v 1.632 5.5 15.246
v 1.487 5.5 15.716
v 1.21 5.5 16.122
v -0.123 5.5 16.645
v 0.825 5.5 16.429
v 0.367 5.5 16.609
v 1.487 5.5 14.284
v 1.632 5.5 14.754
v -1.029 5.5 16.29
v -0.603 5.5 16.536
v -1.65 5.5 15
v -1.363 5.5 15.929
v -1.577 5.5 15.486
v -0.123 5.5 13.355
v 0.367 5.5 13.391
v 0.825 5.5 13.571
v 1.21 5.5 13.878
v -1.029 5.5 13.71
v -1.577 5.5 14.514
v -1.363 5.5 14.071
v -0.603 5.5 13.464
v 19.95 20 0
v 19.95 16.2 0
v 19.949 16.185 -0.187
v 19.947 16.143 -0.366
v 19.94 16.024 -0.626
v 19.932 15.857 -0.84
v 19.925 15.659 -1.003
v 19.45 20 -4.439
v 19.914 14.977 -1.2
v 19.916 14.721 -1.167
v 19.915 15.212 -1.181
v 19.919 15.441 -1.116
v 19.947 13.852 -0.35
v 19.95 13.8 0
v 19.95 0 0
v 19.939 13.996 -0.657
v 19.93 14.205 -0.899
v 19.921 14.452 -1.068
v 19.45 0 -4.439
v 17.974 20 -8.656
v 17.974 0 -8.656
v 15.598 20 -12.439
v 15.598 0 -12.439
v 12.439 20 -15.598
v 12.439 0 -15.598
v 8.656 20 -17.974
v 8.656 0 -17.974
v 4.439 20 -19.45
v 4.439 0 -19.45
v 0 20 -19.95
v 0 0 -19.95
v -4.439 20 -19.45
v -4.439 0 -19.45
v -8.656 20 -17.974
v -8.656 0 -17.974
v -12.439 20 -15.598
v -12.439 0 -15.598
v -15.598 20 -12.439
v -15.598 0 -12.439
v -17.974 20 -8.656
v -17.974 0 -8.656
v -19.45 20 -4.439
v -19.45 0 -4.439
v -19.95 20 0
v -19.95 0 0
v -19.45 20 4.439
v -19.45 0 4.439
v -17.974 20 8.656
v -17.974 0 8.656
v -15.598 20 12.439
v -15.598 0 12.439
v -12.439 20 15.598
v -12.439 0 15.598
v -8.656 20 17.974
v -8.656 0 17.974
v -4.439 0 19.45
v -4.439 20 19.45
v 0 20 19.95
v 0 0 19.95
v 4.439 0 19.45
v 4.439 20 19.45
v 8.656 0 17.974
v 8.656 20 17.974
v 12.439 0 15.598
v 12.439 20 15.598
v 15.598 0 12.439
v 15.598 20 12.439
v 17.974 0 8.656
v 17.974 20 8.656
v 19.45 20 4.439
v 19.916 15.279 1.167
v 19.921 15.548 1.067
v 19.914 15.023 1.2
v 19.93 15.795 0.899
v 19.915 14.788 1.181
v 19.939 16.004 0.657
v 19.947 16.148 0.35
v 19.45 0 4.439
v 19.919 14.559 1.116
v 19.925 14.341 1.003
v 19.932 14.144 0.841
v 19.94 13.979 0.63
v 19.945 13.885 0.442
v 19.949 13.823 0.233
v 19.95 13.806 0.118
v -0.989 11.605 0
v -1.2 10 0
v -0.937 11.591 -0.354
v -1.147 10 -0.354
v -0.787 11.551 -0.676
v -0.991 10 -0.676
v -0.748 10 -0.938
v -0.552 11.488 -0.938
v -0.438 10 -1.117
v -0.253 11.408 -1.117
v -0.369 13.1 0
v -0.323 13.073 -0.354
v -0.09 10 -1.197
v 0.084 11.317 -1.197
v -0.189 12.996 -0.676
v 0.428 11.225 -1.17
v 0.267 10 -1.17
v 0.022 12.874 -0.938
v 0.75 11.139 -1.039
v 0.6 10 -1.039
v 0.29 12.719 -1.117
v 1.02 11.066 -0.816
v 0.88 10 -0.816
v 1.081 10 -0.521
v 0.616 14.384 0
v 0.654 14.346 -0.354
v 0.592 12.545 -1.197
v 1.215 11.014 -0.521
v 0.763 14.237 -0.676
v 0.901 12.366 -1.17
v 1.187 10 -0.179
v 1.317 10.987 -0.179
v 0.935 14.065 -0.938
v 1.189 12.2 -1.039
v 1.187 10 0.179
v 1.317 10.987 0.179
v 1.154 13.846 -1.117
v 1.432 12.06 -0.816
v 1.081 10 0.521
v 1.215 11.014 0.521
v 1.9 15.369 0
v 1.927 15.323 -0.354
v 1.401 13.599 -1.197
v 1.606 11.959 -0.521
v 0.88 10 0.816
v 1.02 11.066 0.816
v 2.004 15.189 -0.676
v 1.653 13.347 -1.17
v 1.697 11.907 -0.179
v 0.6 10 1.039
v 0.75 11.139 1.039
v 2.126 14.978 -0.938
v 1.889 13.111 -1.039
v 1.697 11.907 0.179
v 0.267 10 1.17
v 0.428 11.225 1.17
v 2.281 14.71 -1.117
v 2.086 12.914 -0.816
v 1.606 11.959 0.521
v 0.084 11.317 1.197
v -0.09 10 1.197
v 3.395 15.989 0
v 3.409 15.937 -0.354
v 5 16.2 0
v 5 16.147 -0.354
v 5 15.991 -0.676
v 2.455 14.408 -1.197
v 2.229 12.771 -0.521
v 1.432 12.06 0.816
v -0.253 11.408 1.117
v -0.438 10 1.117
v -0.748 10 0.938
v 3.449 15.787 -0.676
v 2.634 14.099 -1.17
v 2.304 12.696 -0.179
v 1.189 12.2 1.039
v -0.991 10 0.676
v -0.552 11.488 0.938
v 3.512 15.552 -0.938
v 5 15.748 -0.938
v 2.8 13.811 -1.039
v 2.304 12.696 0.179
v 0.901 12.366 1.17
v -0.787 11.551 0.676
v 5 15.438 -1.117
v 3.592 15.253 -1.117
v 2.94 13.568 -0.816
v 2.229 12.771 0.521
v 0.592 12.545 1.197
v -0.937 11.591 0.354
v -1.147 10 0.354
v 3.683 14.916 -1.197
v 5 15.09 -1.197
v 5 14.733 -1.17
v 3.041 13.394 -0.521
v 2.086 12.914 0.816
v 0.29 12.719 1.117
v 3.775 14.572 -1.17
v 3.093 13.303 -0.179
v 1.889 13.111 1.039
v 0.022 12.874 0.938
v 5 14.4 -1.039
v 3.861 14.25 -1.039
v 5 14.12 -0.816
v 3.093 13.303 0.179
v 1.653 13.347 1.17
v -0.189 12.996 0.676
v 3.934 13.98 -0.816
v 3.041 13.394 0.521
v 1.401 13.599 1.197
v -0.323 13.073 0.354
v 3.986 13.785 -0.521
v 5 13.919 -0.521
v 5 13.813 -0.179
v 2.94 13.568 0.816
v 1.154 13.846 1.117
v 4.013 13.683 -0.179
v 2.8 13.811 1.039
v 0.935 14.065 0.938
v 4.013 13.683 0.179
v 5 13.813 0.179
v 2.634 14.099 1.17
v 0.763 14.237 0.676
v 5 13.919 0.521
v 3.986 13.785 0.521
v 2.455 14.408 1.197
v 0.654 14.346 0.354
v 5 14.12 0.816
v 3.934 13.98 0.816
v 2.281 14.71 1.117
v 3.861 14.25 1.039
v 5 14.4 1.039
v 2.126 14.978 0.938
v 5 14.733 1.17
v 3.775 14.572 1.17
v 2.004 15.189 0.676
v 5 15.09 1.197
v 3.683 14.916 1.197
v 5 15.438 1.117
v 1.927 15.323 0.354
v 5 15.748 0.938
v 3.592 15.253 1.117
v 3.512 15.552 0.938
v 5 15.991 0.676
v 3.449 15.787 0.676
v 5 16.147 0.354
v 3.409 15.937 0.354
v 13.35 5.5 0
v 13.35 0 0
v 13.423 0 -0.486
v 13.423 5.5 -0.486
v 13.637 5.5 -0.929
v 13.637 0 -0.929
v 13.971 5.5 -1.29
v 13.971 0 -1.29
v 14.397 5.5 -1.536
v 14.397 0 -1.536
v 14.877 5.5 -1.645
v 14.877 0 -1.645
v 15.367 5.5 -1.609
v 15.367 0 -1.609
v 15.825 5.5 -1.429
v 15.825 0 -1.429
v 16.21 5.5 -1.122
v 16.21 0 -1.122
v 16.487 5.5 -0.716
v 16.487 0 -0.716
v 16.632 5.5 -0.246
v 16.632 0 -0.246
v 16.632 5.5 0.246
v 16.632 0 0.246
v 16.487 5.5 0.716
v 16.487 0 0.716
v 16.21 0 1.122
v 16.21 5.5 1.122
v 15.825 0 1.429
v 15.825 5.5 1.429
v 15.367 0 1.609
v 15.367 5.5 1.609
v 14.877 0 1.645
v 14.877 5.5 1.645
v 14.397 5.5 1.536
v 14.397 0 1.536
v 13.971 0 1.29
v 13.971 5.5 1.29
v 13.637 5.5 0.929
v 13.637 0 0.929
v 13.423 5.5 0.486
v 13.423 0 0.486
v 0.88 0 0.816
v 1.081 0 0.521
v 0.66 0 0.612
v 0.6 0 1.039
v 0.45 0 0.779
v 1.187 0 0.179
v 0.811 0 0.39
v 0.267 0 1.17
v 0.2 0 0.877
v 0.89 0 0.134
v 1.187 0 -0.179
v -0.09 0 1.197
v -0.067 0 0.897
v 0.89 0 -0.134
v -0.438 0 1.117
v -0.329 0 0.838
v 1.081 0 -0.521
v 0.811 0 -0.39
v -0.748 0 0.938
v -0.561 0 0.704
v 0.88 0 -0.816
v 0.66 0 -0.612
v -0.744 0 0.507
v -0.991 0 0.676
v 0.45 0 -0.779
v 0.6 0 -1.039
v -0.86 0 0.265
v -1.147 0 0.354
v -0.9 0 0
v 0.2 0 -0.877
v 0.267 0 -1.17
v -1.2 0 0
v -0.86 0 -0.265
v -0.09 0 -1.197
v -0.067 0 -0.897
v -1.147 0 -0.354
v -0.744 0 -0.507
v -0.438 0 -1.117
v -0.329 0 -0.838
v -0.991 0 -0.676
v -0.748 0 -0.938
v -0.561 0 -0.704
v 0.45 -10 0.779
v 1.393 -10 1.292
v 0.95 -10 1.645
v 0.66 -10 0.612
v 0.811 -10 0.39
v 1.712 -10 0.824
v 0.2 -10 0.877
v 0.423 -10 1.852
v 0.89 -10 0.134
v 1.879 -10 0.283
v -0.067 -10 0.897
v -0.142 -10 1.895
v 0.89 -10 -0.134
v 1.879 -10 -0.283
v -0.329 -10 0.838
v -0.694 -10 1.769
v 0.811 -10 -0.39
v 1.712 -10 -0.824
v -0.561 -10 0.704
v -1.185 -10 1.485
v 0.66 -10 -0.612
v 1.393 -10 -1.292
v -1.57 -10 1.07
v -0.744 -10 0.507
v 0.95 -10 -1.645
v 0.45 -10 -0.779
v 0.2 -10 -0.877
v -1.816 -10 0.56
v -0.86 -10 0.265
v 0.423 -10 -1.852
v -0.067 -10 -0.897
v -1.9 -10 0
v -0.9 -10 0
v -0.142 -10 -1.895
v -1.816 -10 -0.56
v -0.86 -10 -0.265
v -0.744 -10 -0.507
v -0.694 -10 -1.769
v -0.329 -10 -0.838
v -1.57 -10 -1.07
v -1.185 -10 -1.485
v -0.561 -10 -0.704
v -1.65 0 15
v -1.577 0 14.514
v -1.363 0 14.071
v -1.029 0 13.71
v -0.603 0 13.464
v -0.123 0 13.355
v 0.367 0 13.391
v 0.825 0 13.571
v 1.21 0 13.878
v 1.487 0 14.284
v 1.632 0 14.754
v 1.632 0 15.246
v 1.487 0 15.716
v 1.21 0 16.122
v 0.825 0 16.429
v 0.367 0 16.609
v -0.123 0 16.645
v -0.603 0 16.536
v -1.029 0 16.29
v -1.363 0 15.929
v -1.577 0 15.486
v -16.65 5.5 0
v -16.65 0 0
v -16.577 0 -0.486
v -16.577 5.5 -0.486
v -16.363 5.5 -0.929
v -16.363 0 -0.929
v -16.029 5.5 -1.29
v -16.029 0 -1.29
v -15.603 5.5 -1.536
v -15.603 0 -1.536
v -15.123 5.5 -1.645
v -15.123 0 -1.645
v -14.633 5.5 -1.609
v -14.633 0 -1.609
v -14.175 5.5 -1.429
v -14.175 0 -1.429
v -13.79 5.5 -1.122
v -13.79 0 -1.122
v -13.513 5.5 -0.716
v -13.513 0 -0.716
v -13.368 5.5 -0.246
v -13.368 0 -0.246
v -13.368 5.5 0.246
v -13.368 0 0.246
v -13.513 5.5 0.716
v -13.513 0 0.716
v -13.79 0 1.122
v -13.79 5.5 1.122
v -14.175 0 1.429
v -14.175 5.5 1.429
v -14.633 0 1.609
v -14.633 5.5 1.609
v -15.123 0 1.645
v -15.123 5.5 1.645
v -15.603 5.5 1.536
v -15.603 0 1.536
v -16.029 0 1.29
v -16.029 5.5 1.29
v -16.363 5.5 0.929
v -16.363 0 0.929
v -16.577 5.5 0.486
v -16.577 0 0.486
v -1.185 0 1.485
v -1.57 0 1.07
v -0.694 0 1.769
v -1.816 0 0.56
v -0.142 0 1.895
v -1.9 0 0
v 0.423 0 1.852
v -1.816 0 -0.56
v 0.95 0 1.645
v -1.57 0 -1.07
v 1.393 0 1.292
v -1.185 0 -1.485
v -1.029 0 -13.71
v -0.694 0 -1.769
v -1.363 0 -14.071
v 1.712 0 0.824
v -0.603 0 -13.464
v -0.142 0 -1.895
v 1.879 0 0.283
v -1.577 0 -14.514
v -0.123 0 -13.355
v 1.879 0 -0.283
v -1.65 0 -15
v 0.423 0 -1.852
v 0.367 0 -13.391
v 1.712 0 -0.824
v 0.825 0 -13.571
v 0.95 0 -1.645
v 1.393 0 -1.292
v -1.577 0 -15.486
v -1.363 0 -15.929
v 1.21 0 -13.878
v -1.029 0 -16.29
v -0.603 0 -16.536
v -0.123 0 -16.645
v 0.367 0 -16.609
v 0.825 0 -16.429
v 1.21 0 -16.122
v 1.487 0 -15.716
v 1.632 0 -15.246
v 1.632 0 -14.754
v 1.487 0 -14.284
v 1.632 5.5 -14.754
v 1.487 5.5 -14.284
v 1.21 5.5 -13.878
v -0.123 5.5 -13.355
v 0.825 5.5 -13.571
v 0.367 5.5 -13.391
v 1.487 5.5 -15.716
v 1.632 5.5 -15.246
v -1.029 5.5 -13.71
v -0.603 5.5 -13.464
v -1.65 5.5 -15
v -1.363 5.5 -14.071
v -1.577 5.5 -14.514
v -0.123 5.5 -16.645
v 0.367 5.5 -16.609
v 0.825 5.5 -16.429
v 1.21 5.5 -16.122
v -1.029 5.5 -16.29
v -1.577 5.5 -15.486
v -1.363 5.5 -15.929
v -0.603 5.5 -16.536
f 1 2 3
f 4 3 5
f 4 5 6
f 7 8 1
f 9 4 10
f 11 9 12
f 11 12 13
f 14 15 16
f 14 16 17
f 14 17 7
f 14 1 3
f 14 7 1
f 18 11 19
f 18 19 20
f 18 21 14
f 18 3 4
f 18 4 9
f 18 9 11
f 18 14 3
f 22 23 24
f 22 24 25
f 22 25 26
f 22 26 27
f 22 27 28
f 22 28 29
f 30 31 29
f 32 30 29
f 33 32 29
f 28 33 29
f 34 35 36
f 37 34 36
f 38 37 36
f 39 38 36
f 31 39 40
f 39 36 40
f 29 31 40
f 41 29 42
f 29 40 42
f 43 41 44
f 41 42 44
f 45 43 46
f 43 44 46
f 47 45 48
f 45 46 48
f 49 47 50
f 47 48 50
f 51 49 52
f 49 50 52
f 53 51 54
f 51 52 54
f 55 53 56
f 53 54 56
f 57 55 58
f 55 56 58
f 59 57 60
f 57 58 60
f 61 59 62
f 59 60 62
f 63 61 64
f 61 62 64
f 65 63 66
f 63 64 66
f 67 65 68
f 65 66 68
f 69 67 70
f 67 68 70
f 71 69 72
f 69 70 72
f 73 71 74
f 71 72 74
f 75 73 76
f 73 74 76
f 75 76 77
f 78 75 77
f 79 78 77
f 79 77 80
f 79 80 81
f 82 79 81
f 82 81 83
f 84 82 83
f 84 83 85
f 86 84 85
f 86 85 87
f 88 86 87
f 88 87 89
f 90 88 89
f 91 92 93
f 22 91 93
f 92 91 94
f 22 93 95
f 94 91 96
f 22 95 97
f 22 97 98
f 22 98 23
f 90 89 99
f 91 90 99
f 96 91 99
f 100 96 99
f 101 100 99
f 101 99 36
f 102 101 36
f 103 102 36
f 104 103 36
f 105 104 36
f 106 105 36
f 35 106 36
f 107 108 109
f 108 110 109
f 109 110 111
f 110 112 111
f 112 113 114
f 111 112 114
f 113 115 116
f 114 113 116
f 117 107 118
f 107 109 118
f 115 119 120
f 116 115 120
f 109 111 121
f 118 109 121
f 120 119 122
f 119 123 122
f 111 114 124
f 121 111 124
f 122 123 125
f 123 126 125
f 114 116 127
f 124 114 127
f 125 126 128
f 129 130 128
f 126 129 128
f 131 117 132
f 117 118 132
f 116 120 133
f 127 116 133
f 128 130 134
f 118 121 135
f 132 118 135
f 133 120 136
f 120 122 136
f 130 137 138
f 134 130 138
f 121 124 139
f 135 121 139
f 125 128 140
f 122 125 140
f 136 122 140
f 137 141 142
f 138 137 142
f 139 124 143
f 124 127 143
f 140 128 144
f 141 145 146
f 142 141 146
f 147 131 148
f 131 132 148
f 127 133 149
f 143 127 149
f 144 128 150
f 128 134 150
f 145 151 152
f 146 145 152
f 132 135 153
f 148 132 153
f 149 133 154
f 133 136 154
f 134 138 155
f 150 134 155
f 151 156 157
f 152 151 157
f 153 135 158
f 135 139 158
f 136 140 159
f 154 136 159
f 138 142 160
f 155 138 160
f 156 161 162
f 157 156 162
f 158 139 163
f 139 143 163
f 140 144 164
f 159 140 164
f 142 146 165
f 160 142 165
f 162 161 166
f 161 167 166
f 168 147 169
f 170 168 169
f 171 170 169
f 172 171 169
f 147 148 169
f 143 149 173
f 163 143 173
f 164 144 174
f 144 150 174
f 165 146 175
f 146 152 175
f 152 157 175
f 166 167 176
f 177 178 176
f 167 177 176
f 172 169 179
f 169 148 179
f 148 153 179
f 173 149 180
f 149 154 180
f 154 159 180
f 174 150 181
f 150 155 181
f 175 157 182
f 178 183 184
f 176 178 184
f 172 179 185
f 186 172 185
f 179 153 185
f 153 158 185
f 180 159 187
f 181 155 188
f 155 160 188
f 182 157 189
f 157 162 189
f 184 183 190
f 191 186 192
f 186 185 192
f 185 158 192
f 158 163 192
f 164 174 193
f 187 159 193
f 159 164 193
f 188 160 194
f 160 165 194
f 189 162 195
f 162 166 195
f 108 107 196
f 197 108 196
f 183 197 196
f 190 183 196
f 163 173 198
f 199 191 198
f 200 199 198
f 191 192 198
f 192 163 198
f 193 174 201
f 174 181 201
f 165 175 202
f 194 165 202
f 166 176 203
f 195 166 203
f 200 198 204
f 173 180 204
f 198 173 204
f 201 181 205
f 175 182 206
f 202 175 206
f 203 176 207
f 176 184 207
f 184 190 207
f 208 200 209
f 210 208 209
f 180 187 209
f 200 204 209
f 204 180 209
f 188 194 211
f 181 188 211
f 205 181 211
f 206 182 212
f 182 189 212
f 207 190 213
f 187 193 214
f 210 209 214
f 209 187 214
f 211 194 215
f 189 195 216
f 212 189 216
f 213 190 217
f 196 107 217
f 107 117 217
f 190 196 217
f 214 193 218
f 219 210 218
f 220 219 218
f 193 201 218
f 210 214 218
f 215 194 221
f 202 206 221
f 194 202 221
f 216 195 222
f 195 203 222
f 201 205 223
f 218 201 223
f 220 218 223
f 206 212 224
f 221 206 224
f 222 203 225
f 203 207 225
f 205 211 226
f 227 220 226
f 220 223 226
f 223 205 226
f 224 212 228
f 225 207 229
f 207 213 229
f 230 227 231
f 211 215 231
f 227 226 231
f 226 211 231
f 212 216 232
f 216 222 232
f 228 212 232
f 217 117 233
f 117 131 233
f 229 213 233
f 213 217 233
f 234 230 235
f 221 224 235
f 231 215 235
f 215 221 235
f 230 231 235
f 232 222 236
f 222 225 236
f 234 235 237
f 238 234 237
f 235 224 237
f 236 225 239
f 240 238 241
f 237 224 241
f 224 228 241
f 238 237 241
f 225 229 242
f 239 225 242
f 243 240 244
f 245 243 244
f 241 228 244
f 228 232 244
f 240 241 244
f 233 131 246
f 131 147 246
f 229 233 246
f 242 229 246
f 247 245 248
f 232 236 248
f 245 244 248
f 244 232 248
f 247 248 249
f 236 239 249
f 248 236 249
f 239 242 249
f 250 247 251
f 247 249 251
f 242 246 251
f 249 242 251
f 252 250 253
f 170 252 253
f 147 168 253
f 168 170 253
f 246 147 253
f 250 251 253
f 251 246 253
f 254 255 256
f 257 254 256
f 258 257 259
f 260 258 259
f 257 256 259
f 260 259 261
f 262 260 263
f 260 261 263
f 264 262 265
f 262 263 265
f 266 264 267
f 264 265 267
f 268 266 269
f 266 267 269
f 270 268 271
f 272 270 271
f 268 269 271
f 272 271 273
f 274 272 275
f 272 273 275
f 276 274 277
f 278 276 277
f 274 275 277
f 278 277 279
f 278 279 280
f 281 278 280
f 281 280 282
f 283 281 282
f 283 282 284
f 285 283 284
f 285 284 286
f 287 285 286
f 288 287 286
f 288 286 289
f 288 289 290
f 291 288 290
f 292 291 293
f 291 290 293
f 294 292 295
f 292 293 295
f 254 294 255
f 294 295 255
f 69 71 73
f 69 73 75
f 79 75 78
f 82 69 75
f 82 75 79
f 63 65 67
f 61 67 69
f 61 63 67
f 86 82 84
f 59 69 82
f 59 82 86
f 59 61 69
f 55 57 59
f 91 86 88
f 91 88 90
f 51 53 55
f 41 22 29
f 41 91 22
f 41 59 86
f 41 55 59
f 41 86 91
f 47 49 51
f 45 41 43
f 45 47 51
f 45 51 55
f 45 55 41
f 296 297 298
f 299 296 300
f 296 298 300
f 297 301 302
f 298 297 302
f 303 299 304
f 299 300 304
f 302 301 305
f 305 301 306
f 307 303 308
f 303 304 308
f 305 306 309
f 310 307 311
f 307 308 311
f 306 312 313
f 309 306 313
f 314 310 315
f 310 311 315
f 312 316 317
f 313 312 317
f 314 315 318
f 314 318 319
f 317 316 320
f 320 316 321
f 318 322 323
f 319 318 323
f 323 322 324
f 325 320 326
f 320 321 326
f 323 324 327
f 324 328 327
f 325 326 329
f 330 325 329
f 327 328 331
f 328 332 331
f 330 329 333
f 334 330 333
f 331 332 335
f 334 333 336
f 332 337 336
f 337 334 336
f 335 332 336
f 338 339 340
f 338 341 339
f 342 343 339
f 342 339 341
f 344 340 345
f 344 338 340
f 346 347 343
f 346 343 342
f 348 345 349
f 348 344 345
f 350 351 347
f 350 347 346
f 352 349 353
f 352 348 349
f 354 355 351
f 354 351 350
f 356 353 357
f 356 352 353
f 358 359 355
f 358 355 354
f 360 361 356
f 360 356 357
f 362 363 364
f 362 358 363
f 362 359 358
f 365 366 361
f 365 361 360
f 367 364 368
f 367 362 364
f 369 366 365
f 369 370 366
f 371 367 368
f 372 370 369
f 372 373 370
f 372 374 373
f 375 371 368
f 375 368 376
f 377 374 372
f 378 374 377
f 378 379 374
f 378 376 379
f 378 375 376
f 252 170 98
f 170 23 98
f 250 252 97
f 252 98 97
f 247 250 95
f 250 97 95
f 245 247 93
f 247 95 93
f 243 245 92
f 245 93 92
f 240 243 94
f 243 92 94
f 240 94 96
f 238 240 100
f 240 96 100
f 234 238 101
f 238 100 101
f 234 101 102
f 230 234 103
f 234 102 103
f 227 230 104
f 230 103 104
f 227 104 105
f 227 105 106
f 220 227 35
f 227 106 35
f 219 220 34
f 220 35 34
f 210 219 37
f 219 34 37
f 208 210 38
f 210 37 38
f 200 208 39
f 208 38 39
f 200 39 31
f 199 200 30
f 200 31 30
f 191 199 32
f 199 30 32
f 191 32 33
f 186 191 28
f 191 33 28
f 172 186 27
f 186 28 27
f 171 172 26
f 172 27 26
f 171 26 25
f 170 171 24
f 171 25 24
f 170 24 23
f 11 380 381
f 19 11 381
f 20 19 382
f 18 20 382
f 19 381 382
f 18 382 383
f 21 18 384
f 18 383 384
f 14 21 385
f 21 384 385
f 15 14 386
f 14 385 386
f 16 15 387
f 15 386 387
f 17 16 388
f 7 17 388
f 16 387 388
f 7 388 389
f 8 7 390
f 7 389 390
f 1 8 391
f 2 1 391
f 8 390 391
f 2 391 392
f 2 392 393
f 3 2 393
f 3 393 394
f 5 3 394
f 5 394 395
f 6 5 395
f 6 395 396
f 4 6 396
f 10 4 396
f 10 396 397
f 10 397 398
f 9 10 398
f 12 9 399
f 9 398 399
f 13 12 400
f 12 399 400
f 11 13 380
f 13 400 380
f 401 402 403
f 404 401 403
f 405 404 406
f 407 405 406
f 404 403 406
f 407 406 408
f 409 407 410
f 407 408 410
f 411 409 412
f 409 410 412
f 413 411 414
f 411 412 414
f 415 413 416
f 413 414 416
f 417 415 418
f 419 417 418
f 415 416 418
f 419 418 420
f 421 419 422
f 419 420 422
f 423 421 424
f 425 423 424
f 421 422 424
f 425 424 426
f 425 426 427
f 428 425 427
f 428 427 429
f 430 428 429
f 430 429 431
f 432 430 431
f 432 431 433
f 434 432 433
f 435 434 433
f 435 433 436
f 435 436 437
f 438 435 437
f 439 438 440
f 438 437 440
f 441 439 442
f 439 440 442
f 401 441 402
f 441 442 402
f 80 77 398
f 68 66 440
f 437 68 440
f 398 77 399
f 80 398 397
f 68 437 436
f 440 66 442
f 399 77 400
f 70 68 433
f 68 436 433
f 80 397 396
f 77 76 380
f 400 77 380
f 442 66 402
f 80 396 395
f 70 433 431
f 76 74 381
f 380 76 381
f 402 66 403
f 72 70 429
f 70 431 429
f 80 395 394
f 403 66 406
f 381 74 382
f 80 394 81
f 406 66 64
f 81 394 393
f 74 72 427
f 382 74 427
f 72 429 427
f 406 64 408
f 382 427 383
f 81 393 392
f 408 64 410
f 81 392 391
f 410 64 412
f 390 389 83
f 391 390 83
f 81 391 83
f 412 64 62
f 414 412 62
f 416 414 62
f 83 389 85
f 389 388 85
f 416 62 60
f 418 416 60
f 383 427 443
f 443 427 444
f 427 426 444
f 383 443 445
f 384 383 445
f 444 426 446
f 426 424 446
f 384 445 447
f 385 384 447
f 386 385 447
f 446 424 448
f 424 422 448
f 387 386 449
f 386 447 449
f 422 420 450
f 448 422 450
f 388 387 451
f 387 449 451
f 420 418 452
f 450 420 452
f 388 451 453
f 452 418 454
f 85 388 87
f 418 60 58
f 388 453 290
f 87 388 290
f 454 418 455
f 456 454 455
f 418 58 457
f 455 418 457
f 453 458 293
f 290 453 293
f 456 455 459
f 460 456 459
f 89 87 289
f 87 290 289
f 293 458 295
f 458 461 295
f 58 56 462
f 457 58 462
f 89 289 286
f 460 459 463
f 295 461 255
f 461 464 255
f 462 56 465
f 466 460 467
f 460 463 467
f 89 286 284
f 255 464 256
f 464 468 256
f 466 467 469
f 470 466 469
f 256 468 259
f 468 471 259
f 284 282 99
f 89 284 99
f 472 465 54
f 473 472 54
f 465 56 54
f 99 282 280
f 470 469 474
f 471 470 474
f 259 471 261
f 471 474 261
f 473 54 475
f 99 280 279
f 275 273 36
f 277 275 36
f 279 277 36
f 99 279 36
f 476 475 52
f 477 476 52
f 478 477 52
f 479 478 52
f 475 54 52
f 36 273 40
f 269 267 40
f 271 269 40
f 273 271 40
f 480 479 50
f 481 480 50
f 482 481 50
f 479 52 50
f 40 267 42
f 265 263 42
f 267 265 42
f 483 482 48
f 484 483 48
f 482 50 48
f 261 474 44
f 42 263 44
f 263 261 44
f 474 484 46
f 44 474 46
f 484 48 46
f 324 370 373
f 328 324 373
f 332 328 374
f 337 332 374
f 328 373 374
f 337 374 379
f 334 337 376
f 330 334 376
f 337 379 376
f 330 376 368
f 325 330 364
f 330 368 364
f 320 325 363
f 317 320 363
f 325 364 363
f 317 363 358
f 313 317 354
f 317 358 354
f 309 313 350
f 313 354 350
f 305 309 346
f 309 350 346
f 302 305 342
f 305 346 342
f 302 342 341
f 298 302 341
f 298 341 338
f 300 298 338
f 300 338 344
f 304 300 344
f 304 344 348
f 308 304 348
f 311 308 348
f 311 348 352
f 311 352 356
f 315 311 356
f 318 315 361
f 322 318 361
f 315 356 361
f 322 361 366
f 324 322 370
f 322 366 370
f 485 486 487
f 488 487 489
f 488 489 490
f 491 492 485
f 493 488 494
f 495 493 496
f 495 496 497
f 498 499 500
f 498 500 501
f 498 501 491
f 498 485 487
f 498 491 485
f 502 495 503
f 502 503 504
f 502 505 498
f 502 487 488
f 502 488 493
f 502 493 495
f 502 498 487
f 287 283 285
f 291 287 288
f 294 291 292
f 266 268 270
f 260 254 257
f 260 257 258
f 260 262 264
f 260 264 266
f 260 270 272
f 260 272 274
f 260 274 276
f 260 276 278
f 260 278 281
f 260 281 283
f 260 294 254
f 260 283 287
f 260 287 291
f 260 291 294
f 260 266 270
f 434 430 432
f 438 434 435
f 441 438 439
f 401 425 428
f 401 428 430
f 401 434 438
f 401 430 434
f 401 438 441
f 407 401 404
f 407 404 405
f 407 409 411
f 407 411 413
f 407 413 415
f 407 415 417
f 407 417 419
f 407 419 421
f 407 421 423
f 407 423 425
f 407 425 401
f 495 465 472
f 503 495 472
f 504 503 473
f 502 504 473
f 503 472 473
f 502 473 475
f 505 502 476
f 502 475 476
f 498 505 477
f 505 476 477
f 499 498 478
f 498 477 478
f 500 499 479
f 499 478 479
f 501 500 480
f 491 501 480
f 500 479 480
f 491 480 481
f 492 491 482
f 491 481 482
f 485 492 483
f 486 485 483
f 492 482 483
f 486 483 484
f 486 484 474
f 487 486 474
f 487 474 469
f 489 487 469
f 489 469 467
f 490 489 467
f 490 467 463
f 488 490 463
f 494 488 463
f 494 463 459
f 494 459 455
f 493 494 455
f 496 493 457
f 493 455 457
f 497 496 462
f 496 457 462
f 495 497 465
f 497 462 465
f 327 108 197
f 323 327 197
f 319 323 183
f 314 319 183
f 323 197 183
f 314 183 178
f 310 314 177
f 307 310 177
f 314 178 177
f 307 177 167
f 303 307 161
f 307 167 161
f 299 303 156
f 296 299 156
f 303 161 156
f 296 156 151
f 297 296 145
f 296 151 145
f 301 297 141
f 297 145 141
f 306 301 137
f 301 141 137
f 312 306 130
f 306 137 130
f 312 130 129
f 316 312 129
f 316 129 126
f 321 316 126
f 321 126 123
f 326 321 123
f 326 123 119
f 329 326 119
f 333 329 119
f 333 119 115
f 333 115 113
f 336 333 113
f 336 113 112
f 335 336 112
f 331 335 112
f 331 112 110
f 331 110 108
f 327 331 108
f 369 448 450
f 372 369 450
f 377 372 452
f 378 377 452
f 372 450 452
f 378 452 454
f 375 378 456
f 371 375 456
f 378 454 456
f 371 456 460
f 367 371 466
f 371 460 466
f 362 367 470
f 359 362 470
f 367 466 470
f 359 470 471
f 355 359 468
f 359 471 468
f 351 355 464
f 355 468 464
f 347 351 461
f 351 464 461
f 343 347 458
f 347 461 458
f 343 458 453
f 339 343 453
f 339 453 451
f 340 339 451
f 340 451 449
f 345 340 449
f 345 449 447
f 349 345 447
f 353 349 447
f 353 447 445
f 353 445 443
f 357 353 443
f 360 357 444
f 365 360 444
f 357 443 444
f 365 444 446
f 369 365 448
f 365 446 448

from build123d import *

# Parameters (mm, degrees)
SKETCH1_R           = 19.95
BOSS_EXTRUDE1_DEPTH = 20
SKETCH6_R           = 1.2
SKETCH12_R          = 1.9
BOSS_EXTRUDE2_DEPTH = 10
SKETCH13_R          = 0.9
CUT_EXTRUDE1_DEPTH  = 10
SKETCH14_R          = 1.65
CUT_EXTRUDE2_DEPTH  = 5.5


with BuildPart() as part:
    # Sketch1 → Boss-Extrude1 (new body)
    with BuildSketch(Plane(origin=(0, 0, 0), x_dir=(1, 0, 0), z_dir=(0, 1, 0))):
        Circle(SKETCH1_R)
    extrude(amount=BOSS_EXTRUDE1_DEPTH)

    # Cut-Sweep2: sweep along a path in Sketch5
    with BuildLine(Plane.XY) as cut_sweep2_path:
        Line((0, 0), (0, 10))
        ThreePointArc((0, 10), (1.464466094, 13.535533906), (5, 15))
        Line((5, 15), (19.95, 15))
    # Sketch6 → Cut-Sweep2 (sweep, cut)
    with BuildSketch(Plane(origin=(0, 0, 0), x_dir=(-1, 0, 0), z_dir=(0, -1, 0))):
        Circle(SKETCH6_R)
    sweep(path=cut_sweep2_path.line, mode=Mode.SUBTRACT)

    # Sketch12 → Boss-Extrude2 (add)
    with BuildSketch(Plane(origin=(0, 0, 0), x_dir=(-1, 0, 0), z_dir=(0, -1, 0))):
        Circle(SKETCH12_R)
    extrude(amount=BOSS_EXTRUDE2_DEPTH)

    # Sketch13 → Cut-Extrude1 (cut)
    with BuildSketch(Plane(origin=(0, -10, 0), x_dir=(-1, 0, 0), z_dir=(0, -1, 0))):
        Circle(SKETCH13_R)
    extrude(amount=-CUT_EXTRUDE1_DEPTH, mode=Mode.SUBTRACT)

    # Sketch14 → Cut-Extrude2 (cut)
    with BuildSketch(Plane(origin=(0, 0, 0), x_dir=(-1, 0, 0), z_dir=(0, -1, 0))):
        with Locations((-15, 0)):
            Circle(SKETCH14_R)
        with Locations((0, 15)):
            Circle(SKETCH14_R)
        with Locations((0, -15)):
            Circle(SKETCH14_R)
        with Locations((15, 0)):
            Circle(SKETCH14_R)
    extrude(amount=-CUT_EXTRUDE2_DEPTH, mode=Mode.SUBTRACT)


solid = part.part
